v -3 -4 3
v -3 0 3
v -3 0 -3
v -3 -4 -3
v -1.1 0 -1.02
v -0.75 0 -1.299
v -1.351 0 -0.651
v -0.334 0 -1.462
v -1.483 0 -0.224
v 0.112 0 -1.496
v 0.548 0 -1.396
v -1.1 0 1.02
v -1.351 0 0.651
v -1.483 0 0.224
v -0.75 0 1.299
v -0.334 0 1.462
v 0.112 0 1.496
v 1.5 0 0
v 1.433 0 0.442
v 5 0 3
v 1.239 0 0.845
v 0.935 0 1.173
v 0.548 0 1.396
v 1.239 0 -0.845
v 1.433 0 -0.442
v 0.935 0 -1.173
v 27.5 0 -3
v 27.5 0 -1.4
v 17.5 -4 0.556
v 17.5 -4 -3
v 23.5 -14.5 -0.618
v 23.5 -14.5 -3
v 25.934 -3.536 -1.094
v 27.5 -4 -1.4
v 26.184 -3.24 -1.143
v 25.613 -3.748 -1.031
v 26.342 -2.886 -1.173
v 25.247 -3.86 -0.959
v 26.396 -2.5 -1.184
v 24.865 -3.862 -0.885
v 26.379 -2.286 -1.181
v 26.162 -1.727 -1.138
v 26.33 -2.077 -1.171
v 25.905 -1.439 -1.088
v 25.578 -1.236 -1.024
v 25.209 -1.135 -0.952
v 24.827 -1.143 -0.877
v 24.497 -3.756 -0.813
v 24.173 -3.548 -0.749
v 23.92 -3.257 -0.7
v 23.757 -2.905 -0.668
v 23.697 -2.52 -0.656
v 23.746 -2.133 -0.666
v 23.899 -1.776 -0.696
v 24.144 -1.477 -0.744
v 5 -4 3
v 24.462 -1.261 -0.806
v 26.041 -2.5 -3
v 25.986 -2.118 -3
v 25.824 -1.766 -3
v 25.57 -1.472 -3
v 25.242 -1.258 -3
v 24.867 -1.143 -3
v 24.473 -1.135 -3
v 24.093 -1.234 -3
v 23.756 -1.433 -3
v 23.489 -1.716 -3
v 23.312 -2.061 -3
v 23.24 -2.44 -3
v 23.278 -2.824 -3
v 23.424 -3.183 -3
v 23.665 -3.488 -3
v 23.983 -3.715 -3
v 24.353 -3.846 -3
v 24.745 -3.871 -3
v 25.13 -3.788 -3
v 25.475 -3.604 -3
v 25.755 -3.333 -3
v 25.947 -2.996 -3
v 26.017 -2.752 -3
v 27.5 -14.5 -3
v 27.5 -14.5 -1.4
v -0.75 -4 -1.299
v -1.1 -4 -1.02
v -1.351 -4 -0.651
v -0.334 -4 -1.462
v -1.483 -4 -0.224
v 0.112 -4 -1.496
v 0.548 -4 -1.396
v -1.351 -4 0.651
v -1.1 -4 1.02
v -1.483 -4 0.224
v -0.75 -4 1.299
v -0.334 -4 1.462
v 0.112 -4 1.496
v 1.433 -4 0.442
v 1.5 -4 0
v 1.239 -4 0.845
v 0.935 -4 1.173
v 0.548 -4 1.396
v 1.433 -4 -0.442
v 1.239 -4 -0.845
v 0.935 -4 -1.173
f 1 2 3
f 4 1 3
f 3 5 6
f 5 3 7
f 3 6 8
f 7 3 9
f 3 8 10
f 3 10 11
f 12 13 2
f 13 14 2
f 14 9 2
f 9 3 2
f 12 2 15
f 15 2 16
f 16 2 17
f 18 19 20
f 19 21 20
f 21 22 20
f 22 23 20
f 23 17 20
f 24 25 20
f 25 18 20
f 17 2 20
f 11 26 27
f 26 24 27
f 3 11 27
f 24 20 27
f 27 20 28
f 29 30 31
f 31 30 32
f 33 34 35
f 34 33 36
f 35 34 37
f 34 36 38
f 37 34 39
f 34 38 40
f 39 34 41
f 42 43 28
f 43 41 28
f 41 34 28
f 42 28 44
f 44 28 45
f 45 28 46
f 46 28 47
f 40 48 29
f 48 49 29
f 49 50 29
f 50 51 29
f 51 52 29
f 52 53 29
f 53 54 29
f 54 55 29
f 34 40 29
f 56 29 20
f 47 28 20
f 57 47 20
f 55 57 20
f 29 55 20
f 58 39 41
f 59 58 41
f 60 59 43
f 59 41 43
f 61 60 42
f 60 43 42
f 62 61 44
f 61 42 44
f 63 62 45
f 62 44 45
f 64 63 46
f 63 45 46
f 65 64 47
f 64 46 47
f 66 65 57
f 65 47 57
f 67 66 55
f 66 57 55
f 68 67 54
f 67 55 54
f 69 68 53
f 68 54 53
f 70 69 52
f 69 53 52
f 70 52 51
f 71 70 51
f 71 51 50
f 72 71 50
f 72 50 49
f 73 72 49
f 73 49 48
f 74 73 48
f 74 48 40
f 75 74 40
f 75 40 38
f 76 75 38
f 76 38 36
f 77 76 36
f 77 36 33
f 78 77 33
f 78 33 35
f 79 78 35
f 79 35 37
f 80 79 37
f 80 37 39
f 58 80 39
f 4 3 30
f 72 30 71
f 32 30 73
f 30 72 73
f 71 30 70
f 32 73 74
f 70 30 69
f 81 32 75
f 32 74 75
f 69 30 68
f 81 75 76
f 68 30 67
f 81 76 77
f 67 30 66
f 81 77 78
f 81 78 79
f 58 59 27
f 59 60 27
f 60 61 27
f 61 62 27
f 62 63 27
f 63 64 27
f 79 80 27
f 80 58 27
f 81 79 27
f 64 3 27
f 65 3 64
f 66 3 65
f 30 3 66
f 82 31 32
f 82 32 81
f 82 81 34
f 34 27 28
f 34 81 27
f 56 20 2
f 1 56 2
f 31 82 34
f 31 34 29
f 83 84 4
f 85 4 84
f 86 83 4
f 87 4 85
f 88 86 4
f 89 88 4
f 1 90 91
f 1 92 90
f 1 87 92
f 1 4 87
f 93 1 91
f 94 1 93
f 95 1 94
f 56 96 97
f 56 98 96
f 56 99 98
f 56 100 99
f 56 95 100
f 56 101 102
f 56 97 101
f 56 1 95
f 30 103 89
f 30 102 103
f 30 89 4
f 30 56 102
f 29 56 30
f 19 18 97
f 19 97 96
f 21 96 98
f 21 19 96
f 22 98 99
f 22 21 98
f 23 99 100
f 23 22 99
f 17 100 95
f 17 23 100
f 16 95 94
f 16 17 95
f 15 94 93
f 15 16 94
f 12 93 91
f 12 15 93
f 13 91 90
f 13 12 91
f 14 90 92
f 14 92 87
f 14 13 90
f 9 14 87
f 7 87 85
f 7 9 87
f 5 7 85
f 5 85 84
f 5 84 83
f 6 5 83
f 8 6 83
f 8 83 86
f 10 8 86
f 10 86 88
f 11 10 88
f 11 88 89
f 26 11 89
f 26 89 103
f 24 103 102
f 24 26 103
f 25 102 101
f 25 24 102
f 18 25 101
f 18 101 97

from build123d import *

# Parameters (mm, degrees)
F0_R     = 1.5
F1_DEPTH = 4
F3_DEPTH = 10.5
F5_DEPTH = 6.001
F6_R     = 1.375
F7_DEPTH = 7.424825


with BuildPart() as f1:
    # F0 (on Front) → F1 (new body)
    with BuildSketch(Plane.XZ):
        Polygon((5, 3), (-3, 3), (-3, -3), (27.5, -3), (27.5, -1.4), align=None)
        Circle(F0_R, mode=Mode.SUBTRACT)
    extrude(amount=F1_DEPTH)

    # F2 (on face) → F3 (join)
    with BuildSketch(Plane.XZ.offset(4)):
        Polygon((17.5, -3), (27.5, -3), (27.5, -1.4), (17.5, 0.555556), align=None)
    extrude(amount=F3_DEPTH)

    # F4 (on face) → F5 (cut, through all)
    with BuildSketch(Plane(origin=(0, 0, -3), x_dir=(1, 0, 0), z_dir=(0, 0, -1))):
        Polygon((23.5, 14.5), (17.5, 14.5), (17.5, 4), align=None)
    extrude(amount=-F5_DEPTH, mode=Mode.SUBTRACT)

    # F6 (on face) → F7 (cut, through all)
    with BuildSketch(Plane(origin=(0.749225, 0, 3.831263), x_dir=(0.981411, 0, -0.19192), z_dir=(0.19192, 0, 0.981411))):
        with Locations((24.757478, -2.5)):
            Circle(F6_R)
    extrude(amount=-F7_DEPTH, mode=Mode.SUBTRACT)


solid = f1.part
